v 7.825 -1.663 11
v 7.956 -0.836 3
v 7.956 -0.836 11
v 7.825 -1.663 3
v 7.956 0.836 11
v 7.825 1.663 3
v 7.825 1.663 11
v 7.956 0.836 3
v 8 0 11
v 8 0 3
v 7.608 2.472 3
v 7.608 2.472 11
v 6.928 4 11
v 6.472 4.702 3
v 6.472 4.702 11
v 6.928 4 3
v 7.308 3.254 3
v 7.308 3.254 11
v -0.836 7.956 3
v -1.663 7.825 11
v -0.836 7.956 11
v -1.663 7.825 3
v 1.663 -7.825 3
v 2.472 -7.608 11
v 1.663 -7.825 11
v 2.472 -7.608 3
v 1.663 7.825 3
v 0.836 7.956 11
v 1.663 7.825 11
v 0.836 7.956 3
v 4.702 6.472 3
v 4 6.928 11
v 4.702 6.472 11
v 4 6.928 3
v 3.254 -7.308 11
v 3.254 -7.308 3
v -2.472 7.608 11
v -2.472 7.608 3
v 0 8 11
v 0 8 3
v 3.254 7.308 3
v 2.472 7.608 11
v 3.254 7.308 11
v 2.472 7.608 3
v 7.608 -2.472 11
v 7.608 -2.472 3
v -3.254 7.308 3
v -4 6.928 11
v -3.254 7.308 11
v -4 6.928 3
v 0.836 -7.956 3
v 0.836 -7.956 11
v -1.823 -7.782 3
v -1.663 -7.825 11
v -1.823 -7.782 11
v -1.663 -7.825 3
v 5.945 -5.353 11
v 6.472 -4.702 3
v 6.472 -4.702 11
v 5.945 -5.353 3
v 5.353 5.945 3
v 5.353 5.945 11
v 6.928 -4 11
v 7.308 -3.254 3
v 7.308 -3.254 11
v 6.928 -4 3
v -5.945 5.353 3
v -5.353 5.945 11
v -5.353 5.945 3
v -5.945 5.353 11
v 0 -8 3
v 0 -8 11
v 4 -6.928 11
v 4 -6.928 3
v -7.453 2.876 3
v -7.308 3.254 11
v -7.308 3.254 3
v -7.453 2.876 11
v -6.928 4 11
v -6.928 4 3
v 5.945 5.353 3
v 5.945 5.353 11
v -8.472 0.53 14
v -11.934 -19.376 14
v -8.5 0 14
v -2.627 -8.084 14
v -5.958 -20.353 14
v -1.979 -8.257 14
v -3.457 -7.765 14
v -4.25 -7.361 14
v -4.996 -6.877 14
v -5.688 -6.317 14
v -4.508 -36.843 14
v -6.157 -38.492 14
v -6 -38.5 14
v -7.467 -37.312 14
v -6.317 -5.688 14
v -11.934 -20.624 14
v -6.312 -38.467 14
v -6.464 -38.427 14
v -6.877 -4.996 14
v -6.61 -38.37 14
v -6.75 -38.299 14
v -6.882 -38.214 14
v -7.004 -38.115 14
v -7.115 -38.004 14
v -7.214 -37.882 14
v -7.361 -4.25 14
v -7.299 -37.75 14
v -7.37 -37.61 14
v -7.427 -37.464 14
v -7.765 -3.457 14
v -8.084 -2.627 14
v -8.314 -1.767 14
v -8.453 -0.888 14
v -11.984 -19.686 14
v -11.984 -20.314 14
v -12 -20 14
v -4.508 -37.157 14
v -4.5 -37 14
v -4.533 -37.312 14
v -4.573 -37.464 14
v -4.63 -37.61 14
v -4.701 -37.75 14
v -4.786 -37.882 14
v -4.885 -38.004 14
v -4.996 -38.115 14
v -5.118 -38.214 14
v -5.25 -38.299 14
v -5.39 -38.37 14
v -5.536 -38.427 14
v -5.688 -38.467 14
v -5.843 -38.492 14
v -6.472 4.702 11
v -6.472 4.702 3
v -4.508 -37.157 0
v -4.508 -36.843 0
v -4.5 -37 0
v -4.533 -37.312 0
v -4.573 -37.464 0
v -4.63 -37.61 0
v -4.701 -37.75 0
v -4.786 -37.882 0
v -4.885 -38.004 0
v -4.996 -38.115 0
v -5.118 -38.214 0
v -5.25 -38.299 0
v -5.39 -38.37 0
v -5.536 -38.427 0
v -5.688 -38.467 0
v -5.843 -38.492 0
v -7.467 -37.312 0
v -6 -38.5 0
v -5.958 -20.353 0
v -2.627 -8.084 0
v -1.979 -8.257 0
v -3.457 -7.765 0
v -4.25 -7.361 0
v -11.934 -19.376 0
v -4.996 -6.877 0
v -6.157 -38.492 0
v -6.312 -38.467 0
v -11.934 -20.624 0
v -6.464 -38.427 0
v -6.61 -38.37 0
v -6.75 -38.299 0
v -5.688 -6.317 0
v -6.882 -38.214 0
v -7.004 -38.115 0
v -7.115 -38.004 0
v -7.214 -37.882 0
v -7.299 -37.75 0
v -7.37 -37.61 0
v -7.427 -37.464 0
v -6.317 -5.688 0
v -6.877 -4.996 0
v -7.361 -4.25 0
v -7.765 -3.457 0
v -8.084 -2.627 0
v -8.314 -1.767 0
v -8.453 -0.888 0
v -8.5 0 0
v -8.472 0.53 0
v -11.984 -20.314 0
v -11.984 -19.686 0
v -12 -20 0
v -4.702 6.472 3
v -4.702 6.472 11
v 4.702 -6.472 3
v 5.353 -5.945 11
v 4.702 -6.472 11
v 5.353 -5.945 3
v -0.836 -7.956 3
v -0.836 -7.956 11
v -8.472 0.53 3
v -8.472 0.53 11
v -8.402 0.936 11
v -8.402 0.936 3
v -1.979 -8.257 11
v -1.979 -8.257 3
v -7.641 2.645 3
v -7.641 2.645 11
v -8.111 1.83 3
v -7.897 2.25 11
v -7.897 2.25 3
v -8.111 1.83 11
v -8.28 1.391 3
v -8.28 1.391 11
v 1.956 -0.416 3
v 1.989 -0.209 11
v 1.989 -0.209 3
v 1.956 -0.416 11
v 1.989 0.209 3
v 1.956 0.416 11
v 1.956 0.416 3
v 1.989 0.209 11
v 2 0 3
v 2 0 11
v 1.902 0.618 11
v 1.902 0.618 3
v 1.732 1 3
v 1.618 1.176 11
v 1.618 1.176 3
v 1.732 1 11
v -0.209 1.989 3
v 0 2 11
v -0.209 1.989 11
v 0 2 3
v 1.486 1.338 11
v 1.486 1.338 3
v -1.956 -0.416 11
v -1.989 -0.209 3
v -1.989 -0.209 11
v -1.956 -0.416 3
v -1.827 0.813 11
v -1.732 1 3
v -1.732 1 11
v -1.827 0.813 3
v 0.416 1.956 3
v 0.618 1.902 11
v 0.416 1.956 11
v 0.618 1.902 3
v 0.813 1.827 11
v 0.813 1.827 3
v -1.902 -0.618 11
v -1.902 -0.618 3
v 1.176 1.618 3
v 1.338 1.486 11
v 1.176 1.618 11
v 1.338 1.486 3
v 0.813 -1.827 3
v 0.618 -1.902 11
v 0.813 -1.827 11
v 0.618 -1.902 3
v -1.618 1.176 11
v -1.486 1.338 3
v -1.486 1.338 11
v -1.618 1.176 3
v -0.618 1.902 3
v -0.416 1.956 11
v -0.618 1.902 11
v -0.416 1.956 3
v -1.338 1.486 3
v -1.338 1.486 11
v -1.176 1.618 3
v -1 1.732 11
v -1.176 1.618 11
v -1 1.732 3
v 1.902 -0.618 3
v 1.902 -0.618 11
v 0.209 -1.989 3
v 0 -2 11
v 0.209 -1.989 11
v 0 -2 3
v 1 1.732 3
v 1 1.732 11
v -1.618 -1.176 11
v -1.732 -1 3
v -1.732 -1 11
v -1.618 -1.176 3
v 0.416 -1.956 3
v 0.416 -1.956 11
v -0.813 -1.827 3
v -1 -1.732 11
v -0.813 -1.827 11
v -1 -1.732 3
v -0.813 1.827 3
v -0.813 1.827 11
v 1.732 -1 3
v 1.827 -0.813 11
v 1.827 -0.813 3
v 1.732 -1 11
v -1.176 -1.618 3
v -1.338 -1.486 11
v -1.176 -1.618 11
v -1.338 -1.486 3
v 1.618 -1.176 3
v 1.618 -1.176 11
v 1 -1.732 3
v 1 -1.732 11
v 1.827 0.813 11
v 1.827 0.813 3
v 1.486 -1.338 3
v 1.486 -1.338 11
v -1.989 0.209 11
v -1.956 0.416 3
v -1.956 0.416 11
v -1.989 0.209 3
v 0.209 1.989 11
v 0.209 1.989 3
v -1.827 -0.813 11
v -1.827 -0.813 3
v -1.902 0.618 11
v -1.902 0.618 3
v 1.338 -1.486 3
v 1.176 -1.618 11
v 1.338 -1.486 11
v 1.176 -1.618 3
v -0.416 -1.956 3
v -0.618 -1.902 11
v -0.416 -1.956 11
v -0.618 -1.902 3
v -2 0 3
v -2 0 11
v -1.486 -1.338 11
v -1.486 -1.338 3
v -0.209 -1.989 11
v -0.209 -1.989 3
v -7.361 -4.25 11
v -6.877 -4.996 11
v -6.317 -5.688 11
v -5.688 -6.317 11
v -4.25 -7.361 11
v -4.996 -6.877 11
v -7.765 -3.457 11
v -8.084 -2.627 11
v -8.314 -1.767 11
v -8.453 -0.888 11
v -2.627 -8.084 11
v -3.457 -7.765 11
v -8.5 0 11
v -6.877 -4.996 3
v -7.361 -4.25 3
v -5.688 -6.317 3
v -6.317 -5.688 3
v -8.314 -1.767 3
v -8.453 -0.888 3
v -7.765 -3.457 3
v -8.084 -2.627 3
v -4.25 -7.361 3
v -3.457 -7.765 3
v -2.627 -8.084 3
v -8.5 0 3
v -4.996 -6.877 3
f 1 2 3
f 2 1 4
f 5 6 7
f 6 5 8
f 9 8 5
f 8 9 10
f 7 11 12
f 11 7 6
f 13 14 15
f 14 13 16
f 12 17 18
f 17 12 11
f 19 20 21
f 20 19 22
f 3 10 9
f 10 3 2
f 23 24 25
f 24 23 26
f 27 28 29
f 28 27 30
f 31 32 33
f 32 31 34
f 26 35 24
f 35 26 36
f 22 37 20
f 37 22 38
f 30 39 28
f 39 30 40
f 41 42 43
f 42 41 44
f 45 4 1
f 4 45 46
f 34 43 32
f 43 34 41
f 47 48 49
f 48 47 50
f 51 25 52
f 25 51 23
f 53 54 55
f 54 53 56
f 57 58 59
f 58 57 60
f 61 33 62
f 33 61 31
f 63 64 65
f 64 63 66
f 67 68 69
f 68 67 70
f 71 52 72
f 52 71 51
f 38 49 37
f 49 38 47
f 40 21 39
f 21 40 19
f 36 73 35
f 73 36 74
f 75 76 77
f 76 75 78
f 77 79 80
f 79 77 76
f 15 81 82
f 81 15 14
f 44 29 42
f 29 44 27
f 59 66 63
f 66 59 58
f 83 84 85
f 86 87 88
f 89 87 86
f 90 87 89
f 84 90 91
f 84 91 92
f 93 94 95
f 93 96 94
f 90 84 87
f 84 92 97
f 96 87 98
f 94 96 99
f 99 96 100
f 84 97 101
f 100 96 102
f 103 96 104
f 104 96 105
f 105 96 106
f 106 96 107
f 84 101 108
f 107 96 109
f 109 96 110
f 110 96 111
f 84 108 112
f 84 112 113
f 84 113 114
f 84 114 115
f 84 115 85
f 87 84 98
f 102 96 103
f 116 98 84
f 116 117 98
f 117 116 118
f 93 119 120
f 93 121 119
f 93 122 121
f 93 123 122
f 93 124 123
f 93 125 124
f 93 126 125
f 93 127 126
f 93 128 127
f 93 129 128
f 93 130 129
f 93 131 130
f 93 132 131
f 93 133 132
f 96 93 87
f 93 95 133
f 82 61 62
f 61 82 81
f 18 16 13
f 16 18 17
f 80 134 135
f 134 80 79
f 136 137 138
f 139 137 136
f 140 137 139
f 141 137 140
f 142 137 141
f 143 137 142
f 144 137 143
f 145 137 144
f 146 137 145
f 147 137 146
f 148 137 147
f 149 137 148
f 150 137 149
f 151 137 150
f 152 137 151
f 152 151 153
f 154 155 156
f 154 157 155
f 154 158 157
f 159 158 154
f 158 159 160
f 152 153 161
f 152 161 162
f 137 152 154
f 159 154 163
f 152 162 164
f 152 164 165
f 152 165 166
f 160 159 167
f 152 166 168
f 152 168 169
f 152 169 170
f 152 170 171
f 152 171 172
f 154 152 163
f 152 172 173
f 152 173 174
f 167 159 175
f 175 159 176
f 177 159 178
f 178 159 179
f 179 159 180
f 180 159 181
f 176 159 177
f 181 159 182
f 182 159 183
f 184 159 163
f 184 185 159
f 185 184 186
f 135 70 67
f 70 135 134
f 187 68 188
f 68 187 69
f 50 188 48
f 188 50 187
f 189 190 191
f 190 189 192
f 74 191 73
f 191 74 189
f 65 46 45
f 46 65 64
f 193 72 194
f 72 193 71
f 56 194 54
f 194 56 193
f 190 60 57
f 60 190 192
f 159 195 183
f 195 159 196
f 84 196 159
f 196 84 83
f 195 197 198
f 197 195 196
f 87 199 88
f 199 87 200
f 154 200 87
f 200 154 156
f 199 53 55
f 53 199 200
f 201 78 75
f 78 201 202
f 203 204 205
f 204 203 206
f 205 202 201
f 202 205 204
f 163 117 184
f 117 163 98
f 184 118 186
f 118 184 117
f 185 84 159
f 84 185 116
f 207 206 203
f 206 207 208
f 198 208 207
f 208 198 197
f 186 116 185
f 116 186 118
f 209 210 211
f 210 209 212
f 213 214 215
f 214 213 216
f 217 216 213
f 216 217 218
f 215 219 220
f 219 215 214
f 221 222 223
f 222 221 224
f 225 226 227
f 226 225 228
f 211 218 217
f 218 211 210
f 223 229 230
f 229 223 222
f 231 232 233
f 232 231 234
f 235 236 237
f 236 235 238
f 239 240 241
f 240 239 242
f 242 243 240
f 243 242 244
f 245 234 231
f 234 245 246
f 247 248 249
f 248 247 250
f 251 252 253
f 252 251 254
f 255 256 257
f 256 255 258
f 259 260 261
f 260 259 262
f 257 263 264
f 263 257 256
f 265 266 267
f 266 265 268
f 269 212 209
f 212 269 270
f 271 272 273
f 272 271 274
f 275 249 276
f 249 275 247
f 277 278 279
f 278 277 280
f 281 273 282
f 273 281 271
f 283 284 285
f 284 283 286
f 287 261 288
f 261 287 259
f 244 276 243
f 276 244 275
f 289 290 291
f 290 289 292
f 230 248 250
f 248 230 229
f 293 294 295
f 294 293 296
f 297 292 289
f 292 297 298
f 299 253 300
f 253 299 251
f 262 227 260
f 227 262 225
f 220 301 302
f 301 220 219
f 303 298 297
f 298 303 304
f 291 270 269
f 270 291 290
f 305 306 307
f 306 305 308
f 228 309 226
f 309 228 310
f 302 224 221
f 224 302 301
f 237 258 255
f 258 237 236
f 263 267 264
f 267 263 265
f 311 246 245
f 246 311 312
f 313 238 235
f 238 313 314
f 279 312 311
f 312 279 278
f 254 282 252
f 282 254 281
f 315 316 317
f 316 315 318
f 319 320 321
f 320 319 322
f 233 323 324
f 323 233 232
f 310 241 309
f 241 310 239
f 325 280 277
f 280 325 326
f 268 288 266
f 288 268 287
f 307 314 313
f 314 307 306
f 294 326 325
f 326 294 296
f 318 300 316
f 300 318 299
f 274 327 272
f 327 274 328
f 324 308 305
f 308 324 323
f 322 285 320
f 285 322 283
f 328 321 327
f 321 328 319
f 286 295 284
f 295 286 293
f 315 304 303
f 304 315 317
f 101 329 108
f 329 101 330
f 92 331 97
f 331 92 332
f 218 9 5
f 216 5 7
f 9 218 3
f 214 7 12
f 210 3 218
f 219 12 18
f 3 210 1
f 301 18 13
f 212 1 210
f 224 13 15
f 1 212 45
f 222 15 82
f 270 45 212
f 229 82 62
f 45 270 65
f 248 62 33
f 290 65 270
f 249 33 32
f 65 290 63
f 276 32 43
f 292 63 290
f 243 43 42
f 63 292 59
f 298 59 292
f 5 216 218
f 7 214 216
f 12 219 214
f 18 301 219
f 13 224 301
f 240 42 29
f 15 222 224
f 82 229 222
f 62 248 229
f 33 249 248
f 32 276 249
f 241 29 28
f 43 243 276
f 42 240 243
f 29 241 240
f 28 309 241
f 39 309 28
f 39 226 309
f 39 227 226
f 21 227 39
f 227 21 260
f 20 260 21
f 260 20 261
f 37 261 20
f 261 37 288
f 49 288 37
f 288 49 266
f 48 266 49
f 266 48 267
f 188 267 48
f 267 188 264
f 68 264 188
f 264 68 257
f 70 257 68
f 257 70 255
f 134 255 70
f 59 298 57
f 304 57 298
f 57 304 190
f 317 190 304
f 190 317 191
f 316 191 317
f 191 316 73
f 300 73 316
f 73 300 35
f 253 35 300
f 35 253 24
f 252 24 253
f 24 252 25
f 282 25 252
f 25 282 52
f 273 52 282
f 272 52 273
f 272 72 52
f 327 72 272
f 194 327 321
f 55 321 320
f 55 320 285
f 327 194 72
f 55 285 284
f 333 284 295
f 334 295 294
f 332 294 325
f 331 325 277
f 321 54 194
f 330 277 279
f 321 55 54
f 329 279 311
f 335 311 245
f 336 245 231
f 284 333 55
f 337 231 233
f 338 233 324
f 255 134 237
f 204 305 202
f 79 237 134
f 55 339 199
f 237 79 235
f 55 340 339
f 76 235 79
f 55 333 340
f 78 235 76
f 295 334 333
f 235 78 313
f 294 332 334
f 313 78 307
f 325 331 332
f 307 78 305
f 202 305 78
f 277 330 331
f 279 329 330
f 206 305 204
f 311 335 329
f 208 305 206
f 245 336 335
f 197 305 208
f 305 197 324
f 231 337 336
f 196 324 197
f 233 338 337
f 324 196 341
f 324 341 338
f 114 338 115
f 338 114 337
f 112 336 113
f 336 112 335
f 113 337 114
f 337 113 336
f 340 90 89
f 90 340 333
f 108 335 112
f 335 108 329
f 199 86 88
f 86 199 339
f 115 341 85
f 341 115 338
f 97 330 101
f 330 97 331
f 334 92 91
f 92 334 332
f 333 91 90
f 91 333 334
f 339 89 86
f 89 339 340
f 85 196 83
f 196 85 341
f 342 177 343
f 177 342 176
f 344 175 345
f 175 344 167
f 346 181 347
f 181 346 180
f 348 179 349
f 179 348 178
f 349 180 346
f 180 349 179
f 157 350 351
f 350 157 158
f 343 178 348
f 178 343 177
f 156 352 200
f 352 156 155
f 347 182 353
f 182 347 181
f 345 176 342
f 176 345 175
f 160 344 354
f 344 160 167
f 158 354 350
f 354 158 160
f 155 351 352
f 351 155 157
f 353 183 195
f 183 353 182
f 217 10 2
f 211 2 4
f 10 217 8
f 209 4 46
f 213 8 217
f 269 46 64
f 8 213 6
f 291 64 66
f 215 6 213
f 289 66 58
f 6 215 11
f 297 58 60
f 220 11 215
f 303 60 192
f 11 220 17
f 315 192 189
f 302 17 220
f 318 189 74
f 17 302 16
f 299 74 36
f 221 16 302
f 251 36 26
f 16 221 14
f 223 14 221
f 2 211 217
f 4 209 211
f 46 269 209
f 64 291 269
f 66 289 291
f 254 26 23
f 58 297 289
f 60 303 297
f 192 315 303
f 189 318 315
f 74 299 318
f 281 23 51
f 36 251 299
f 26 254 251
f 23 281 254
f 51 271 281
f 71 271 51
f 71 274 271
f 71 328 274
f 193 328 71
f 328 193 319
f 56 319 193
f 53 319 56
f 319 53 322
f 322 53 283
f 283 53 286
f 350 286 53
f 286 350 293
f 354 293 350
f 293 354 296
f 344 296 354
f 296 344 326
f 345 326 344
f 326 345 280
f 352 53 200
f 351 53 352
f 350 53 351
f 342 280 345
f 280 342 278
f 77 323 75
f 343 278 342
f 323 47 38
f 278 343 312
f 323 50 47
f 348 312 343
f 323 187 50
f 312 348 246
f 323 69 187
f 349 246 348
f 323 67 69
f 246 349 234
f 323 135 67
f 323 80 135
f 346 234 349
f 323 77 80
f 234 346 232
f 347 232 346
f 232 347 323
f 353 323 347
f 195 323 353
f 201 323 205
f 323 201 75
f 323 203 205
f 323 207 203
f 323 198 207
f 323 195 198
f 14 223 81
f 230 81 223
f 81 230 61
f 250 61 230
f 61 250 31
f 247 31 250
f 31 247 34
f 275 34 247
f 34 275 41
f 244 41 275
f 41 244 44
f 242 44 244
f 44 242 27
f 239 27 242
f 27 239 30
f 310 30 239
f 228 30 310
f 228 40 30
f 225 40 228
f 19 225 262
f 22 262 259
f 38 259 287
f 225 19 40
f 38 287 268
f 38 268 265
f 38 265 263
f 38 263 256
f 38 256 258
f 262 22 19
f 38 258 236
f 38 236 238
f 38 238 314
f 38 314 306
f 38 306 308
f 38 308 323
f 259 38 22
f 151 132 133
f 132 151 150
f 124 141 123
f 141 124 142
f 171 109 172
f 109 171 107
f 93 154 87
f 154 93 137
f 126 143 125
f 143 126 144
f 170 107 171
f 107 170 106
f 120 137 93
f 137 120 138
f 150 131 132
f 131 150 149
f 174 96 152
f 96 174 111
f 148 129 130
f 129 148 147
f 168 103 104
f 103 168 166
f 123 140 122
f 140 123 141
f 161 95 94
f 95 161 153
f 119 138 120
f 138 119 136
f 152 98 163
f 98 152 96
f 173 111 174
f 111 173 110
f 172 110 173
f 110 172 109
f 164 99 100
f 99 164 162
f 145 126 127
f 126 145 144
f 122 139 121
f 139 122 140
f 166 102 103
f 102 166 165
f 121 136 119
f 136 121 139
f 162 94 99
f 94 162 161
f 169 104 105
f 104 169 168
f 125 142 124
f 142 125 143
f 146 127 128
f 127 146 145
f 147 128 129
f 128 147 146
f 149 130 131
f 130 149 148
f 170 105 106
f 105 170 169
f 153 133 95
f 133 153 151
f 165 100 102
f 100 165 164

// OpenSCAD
$fn=60;

difference(){
union(){
    
cylinder(d=16,h=14);

hull(){
translate([-4,0,0])cylinder(d=9,h=14);
translate([-9,-20,0])cylinder(d=6,h=14);
}
}
cylinder(d=4,h=22);
translate([0,0,11])cylinder(d=17,h=14);
cylinder(d=17,h=3);
}

hull(){
translate([-9,-20,0])cylinder(d=6,h=14);
translate([-6,-37,0])cylinder(d=3,h=14);
}
